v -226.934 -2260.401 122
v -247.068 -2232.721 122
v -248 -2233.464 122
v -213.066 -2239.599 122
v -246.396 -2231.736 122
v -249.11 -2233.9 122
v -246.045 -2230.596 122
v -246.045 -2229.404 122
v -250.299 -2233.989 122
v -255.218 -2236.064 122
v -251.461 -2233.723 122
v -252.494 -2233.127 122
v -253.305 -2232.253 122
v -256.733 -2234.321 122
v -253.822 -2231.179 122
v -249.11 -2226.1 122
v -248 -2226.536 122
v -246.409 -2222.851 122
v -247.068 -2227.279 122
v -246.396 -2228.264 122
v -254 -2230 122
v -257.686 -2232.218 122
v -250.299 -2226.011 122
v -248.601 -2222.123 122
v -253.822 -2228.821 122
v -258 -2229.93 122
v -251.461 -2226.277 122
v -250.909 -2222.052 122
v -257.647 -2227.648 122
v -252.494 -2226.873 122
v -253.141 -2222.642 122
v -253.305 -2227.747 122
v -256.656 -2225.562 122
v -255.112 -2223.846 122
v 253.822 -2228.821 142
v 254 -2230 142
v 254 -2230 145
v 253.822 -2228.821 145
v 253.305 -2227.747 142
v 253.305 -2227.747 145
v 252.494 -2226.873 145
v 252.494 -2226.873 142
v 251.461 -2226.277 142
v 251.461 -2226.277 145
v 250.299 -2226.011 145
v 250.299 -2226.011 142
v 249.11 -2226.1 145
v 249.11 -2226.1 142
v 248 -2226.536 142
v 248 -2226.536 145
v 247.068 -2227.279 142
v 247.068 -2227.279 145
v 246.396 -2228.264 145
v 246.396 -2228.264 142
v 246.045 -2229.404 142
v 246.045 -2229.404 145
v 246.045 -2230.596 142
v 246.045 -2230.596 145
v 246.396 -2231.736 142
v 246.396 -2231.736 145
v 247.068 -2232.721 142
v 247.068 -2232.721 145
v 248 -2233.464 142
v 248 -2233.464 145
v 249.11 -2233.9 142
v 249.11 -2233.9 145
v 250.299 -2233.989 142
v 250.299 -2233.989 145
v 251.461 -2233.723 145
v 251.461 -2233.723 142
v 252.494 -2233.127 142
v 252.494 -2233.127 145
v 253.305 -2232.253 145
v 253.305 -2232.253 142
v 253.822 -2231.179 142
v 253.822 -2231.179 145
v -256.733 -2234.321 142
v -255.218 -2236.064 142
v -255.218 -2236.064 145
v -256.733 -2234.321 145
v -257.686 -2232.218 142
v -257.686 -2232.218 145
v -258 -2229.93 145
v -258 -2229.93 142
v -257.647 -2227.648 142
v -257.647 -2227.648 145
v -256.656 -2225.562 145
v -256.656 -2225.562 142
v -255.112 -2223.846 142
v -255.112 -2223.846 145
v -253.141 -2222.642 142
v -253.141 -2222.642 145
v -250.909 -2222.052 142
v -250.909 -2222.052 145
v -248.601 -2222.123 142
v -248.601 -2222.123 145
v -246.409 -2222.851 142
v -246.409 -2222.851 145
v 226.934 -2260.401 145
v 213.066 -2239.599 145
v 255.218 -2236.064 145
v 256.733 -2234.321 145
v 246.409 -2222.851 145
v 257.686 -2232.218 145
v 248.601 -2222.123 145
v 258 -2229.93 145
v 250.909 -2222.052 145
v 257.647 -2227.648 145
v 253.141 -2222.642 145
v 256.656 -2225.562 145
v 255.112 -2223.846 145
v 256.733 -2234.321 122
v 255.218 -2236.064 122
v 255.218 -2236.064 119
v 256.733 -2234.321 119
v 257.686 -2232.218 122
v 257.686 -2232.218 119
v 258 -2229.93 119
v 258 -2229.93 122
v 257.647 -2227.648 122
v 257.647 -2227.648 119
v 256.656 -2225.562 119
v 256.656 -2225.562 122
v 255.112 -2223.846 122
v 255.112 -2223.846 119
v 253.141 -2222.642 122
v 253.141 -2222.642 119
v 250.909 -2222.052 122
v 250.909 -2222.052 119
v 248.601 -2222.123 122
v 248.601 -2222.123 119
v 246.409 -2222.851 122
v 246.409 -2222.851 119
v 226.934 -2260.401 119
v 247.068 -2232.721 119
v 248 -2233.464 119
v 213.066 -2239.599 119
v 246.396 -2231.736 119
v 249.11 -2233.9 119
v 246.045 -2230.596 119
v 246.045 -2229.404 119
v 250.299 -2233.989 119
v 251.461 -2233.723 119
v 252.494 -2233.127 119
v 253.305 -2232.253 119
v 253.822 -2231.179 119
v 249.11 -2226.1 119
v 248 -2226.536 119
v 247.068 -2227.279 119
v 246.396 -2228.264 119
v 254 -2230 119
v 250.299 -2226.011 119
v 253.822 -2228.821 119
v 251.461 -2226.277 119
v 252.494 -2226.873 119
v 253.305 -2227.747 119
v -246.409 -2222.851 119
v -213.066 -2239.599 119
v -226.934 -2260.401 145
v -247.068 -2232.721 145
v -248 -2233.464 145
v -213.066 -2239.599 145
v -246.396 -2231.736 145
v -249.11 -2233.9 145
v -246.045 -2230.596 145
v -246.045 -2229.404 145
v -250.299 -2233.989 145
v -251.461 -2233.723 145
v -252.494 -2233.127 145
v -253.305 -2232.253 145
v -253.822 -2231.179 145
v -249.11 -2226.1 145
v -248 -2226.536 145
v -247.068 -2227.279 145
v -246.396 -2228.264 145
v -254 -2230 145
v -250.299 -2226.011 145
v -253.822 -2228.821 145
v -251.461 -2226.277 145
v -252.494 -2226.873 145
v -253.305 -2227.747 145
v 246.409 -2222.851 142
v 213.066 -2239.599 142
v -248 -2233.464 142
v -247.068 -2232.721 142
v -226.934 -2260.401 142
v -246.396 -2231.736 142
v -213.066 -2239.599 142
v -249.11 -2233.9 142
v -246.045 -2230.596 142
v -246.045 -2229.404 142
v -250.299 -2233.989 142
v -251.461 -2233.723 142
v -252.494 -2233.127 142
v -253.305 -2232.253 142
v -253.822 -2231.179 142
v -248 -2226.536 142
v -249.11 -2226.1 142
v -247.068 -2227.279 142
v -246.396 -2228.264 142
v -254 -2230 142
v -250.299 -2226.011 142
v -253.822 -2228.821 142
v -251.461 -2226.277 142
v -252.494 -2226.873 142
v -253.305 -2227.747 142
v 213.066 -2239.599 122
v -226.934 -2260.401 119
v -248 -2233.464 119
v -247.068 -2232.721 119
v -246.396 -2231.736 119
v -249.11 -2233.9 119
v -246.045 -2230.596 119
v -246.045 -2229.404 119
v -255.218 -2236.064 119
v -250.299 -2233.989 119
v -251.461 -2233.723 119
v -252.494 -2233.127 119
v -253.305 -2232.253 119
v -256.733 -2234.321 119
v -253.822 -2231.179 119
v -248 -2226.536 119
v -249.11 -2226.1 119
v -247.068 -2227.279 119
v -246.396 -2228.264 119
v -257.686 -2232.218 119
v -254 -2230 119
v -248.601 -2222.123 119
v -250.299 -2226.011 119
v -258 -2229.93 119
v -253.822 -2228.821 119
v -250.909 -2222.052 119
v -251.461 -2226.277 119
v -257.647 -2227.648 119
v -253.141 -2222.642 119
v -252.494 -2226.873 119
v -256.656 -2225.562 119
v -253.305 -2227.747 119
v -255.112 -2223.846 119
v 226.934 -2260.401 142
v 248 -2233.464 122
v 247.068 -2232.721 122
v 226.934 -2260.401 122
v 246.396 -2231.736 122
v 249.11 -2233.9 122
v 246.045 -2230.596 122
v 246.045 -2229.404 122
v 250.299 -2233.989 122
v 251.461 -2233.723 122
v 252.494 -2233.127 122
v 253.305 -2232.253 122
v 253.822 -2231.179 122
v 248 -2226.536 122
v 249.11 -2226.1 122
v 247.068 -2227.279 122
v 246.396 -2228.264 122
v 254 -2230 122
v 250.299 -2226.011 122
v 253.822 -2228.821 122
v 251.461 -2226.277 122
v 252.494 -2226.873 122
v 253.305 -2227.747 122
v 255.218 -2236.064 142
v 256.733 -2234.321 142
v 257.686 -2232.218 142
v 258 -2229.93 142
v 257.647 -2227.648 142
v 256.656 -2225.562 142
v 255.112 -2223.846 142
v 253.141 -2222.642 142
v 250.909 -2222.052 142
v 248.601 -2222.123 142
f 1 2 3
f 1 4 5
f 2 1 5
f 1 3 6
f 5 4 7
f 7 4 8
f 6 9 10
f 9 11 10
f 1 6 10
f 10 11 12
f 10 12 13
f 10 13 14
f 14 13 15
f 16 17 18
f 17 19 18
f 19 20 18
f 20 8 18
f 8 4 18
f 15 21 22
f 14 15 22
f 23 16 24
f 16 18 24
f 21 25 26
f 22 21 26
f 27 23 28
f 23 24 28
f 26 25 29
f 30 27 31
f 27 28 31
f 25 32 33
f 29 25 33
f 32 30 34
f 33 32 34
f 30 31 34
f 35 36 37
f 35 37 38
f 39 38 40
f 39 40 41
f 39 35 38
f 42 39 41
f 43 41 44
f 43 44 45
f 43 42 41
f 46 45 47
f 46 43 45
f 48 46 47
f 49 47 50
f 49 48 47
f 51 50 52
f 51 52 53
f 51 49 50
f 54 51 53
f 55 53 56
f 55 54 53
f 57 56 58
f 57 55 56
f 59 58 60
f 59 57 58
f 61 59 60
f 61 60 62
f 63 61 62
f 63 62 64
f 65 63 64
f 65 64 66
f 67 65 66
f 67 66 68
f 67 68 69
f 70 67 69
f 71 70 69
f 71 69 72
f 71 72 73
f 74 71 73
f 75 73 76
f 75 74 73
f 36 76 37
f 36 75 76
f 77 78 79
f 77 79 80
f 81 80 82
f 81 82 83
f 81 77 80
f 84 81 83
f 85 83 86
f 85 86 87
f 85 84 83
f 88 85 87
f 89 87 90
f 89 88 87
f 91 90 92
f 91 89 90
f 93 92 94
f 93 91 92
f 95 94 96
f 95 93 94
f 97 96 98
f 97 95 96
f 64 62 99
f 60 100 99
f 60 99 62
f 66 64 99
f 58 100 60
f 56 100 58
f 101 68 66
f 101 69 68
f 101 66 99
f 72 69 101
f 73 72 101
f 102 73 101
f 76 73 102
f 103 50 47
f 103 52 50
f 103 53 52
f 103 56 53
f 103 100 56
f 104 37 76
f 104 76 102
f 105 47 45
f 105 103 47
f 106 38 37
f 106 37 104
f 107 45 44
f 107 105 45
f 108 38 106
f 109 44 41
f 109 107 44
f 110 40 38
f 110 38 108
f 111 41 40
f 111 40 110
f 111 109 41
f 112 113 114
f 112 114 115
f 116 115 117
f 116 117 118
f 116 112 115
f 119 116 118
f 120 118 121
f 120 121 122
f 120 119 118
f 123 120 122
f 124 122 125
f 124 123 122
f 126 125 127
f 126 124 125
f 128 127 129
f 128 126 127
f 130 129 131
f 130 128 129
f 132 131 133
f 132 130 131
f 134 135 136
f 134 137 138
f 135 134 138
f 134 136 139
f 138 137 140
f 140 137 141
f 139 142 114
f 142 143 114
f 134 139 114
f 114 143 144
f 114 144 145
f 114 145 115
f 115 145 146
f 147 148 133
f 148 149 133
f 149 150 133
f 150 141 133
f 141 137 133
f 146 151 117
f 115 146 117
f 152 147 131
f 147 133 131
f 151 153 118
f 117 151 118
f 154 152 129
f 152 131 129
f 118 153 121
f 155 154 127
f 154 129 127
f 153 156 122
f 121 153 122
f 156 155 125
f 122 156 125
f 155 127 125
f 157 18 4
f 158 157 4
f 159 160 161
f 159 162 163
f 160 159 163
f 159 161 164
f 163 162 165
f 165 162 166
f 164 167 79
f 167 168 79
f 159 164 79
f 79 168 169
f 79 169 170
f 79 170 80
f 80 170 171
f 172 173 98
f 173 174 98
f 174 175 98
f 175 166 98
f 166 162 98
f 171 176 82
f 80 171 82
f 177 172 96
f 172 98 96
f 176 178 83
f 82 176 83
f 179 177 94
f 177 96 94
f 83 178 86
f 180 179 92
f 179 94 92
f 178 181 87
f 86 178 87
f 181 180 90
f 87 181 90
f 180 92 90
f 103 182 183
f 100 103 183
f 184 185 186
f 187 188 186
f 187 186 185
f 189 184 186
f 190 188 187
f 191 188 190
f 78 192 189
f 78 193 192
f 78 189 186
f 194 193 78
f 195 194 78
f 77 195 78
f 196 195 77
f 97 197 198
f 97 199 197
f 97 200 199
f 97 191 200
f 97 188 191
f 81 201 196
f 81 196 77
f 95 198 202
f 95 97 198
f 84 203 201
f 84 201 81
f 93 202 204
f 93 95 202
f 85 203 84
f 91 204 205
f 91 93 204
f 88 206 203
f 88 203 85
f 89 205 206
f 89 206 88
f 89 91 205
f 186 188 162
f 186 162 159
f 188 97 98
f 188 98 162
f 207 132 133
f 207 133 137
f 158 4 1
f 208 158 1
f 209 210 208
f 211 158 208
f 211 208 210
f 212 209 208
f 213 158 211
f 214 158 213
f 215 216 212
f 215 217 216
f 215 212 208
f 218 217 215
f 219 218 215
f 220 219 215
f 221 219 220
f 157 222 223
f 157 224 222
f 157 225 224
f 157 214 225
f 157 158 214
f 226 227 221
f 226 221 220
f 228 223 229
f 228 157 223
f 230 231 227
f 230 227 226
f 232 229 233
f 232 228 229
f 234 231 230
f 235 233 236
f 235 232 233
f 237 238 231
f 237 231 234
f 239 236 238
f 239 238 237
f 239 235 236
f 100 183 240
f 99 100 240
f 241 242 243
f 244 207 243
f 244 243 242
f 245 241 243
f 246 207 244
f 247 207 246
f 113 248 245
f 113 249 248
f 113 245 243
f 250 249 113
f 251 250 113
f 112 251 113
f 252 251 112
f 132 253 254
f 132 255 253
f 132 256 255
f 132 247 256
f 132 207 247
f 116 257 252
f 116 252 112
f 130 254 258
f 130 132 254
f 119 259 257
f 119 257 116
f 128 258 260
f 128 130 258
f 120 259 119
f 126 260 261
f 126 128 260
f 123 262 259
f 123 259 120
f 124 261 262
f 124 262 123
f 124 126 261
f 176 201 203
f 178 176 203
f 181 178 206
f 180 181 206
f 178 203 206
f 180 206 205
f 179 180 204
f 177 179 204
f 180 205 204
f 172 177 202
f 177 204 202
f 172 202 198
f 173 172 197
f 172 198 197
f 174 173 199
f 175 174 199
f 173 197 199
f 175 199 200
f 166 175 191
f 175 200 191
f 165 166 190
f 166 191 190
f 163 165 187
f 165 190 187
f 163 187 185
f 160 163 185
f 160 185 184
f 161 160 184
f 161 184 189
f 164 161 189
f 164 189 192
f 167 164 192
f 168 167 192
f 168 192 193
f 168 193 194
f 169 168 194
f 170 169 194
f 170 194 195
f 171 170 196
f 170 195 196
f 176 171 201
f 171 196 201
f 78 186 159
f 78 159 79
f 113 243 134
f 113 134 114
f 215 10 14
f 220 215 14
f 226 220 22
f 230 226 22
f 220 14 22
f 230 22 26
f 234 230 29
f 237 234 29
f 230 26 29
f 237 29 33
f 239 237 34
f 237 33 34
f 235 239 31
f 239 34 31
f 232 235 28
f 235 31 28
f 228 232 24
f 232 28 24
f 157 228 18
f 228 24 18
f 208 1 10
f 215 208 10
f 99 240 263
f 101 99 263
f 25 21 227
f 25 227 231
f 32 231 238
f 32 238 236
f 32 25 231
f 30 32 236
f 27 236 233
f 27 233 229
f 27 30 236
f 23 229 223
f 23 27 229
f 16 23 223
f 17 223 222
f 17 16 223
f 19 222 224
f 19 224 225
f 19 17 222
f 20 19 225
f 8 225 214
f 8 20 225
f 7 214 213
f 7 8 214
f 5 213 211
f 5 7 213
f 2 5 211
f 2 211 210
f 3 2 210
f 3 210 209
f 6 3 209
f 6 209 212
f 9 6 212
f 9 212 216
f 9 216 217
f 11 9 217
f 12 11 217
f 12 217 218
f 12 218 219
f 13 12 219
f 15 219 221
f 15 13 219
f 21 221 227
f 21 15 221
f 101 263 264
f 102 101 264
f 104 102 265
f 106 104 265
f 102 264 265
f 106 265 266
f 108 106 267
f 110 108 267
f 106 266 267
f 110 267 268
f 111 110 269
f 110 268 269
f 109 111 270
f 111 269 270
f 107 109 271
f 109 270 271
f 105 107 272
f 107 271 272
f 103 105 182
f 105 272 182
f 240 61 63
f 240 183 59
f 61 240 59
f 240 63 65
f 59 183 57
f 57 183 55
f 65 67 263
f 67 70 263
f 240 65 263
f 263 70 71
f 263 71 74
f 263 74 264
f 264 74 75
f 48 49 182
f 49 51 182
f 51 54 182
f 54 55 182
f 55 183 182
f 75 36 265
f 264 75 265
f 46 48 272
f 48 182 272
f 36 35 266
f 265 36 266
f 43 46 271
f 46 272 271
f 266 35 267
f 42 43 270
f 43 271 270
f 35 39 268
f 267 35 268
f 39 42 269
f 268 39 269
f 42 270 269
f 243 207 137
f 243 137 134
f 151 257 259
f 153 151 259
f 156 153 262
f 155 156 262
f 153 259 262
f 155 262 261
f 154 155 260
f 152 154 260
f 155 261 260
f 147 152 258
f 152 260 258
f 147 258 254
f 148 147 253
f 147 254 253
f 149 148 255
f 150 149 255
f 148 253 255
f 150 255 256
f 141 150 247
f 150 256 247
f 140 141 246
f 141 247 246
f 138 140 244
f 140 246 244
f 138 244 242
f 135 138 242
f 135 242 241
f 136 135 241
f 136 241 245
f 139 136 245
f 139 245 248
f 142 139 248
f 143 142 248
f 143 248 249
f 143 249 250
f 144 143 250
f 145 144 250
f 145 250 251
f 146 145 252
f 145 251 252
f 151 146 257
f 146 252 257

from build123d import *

# Parameters (mm, degrees)
BOSS_EXTRUDE1_START     = 142
BOSS_EXTRUDE1_OUTLINE_R = 4
BOSS_EXTRUDE1_DEPTH     = 3


# Read off the part's stored shape, not the designer's step: Boss-Extrude1
with BuildPart() as part:
    # Boss-Extrude1 outline → Boss-Extrude1 (new body)
    with BuildSketch(Plane.XY.offset(BOSS_EXTRUDE1_START)):
        with BuildLine():
            Line((226.933752453, -2260.400628679), (255.217810768, -2236.064194158))
            ThreePointArc((255.217810768, -2236.064194158), (256.656402355, -2225.56239843), (246.409132611, -2222.851176922))
            Line((246.409132611, -2222.851176922), (213.066247547, -2239.599371321))
            Line((213.066247547, -2239.599371321), (226.933752453, -2260.400628679))
        make_face()
        with Locations((250, -2230)):
            Circle(BOSS_EXTRUDE1_OUTLINE_R, mode=Mode.SUBTRACT)
    extrude(amount=BOSS_EXTRUDE1_DEPTH)


with BuildPart() as body_2:
    # Mirror1: mirrored copy
    add(part.part.mirror(Plane(origin=(0, 0, 132), x_dir=(1, 0, 0), z_dir=(0, 0, -1))))


with BuildPart() as body_3:
    # Mirror2: mirrored copy
    add(part.part.mirror(Plane(origin=(0, 0, 0), x_dir=(0, 0, 1), z_dir=(1, 0, 0))))


with BuildPart() as body_4:
    # Mirror2 2: mirrored copy
    add(body_2.part.mirror(Plane(origin=(0, 0, 0), x_dir=(0, 0, 1), z_dir=(1, 0, 0))))


solid = Compound([part.part, body_2.part, body_3.part, body_4.part])
